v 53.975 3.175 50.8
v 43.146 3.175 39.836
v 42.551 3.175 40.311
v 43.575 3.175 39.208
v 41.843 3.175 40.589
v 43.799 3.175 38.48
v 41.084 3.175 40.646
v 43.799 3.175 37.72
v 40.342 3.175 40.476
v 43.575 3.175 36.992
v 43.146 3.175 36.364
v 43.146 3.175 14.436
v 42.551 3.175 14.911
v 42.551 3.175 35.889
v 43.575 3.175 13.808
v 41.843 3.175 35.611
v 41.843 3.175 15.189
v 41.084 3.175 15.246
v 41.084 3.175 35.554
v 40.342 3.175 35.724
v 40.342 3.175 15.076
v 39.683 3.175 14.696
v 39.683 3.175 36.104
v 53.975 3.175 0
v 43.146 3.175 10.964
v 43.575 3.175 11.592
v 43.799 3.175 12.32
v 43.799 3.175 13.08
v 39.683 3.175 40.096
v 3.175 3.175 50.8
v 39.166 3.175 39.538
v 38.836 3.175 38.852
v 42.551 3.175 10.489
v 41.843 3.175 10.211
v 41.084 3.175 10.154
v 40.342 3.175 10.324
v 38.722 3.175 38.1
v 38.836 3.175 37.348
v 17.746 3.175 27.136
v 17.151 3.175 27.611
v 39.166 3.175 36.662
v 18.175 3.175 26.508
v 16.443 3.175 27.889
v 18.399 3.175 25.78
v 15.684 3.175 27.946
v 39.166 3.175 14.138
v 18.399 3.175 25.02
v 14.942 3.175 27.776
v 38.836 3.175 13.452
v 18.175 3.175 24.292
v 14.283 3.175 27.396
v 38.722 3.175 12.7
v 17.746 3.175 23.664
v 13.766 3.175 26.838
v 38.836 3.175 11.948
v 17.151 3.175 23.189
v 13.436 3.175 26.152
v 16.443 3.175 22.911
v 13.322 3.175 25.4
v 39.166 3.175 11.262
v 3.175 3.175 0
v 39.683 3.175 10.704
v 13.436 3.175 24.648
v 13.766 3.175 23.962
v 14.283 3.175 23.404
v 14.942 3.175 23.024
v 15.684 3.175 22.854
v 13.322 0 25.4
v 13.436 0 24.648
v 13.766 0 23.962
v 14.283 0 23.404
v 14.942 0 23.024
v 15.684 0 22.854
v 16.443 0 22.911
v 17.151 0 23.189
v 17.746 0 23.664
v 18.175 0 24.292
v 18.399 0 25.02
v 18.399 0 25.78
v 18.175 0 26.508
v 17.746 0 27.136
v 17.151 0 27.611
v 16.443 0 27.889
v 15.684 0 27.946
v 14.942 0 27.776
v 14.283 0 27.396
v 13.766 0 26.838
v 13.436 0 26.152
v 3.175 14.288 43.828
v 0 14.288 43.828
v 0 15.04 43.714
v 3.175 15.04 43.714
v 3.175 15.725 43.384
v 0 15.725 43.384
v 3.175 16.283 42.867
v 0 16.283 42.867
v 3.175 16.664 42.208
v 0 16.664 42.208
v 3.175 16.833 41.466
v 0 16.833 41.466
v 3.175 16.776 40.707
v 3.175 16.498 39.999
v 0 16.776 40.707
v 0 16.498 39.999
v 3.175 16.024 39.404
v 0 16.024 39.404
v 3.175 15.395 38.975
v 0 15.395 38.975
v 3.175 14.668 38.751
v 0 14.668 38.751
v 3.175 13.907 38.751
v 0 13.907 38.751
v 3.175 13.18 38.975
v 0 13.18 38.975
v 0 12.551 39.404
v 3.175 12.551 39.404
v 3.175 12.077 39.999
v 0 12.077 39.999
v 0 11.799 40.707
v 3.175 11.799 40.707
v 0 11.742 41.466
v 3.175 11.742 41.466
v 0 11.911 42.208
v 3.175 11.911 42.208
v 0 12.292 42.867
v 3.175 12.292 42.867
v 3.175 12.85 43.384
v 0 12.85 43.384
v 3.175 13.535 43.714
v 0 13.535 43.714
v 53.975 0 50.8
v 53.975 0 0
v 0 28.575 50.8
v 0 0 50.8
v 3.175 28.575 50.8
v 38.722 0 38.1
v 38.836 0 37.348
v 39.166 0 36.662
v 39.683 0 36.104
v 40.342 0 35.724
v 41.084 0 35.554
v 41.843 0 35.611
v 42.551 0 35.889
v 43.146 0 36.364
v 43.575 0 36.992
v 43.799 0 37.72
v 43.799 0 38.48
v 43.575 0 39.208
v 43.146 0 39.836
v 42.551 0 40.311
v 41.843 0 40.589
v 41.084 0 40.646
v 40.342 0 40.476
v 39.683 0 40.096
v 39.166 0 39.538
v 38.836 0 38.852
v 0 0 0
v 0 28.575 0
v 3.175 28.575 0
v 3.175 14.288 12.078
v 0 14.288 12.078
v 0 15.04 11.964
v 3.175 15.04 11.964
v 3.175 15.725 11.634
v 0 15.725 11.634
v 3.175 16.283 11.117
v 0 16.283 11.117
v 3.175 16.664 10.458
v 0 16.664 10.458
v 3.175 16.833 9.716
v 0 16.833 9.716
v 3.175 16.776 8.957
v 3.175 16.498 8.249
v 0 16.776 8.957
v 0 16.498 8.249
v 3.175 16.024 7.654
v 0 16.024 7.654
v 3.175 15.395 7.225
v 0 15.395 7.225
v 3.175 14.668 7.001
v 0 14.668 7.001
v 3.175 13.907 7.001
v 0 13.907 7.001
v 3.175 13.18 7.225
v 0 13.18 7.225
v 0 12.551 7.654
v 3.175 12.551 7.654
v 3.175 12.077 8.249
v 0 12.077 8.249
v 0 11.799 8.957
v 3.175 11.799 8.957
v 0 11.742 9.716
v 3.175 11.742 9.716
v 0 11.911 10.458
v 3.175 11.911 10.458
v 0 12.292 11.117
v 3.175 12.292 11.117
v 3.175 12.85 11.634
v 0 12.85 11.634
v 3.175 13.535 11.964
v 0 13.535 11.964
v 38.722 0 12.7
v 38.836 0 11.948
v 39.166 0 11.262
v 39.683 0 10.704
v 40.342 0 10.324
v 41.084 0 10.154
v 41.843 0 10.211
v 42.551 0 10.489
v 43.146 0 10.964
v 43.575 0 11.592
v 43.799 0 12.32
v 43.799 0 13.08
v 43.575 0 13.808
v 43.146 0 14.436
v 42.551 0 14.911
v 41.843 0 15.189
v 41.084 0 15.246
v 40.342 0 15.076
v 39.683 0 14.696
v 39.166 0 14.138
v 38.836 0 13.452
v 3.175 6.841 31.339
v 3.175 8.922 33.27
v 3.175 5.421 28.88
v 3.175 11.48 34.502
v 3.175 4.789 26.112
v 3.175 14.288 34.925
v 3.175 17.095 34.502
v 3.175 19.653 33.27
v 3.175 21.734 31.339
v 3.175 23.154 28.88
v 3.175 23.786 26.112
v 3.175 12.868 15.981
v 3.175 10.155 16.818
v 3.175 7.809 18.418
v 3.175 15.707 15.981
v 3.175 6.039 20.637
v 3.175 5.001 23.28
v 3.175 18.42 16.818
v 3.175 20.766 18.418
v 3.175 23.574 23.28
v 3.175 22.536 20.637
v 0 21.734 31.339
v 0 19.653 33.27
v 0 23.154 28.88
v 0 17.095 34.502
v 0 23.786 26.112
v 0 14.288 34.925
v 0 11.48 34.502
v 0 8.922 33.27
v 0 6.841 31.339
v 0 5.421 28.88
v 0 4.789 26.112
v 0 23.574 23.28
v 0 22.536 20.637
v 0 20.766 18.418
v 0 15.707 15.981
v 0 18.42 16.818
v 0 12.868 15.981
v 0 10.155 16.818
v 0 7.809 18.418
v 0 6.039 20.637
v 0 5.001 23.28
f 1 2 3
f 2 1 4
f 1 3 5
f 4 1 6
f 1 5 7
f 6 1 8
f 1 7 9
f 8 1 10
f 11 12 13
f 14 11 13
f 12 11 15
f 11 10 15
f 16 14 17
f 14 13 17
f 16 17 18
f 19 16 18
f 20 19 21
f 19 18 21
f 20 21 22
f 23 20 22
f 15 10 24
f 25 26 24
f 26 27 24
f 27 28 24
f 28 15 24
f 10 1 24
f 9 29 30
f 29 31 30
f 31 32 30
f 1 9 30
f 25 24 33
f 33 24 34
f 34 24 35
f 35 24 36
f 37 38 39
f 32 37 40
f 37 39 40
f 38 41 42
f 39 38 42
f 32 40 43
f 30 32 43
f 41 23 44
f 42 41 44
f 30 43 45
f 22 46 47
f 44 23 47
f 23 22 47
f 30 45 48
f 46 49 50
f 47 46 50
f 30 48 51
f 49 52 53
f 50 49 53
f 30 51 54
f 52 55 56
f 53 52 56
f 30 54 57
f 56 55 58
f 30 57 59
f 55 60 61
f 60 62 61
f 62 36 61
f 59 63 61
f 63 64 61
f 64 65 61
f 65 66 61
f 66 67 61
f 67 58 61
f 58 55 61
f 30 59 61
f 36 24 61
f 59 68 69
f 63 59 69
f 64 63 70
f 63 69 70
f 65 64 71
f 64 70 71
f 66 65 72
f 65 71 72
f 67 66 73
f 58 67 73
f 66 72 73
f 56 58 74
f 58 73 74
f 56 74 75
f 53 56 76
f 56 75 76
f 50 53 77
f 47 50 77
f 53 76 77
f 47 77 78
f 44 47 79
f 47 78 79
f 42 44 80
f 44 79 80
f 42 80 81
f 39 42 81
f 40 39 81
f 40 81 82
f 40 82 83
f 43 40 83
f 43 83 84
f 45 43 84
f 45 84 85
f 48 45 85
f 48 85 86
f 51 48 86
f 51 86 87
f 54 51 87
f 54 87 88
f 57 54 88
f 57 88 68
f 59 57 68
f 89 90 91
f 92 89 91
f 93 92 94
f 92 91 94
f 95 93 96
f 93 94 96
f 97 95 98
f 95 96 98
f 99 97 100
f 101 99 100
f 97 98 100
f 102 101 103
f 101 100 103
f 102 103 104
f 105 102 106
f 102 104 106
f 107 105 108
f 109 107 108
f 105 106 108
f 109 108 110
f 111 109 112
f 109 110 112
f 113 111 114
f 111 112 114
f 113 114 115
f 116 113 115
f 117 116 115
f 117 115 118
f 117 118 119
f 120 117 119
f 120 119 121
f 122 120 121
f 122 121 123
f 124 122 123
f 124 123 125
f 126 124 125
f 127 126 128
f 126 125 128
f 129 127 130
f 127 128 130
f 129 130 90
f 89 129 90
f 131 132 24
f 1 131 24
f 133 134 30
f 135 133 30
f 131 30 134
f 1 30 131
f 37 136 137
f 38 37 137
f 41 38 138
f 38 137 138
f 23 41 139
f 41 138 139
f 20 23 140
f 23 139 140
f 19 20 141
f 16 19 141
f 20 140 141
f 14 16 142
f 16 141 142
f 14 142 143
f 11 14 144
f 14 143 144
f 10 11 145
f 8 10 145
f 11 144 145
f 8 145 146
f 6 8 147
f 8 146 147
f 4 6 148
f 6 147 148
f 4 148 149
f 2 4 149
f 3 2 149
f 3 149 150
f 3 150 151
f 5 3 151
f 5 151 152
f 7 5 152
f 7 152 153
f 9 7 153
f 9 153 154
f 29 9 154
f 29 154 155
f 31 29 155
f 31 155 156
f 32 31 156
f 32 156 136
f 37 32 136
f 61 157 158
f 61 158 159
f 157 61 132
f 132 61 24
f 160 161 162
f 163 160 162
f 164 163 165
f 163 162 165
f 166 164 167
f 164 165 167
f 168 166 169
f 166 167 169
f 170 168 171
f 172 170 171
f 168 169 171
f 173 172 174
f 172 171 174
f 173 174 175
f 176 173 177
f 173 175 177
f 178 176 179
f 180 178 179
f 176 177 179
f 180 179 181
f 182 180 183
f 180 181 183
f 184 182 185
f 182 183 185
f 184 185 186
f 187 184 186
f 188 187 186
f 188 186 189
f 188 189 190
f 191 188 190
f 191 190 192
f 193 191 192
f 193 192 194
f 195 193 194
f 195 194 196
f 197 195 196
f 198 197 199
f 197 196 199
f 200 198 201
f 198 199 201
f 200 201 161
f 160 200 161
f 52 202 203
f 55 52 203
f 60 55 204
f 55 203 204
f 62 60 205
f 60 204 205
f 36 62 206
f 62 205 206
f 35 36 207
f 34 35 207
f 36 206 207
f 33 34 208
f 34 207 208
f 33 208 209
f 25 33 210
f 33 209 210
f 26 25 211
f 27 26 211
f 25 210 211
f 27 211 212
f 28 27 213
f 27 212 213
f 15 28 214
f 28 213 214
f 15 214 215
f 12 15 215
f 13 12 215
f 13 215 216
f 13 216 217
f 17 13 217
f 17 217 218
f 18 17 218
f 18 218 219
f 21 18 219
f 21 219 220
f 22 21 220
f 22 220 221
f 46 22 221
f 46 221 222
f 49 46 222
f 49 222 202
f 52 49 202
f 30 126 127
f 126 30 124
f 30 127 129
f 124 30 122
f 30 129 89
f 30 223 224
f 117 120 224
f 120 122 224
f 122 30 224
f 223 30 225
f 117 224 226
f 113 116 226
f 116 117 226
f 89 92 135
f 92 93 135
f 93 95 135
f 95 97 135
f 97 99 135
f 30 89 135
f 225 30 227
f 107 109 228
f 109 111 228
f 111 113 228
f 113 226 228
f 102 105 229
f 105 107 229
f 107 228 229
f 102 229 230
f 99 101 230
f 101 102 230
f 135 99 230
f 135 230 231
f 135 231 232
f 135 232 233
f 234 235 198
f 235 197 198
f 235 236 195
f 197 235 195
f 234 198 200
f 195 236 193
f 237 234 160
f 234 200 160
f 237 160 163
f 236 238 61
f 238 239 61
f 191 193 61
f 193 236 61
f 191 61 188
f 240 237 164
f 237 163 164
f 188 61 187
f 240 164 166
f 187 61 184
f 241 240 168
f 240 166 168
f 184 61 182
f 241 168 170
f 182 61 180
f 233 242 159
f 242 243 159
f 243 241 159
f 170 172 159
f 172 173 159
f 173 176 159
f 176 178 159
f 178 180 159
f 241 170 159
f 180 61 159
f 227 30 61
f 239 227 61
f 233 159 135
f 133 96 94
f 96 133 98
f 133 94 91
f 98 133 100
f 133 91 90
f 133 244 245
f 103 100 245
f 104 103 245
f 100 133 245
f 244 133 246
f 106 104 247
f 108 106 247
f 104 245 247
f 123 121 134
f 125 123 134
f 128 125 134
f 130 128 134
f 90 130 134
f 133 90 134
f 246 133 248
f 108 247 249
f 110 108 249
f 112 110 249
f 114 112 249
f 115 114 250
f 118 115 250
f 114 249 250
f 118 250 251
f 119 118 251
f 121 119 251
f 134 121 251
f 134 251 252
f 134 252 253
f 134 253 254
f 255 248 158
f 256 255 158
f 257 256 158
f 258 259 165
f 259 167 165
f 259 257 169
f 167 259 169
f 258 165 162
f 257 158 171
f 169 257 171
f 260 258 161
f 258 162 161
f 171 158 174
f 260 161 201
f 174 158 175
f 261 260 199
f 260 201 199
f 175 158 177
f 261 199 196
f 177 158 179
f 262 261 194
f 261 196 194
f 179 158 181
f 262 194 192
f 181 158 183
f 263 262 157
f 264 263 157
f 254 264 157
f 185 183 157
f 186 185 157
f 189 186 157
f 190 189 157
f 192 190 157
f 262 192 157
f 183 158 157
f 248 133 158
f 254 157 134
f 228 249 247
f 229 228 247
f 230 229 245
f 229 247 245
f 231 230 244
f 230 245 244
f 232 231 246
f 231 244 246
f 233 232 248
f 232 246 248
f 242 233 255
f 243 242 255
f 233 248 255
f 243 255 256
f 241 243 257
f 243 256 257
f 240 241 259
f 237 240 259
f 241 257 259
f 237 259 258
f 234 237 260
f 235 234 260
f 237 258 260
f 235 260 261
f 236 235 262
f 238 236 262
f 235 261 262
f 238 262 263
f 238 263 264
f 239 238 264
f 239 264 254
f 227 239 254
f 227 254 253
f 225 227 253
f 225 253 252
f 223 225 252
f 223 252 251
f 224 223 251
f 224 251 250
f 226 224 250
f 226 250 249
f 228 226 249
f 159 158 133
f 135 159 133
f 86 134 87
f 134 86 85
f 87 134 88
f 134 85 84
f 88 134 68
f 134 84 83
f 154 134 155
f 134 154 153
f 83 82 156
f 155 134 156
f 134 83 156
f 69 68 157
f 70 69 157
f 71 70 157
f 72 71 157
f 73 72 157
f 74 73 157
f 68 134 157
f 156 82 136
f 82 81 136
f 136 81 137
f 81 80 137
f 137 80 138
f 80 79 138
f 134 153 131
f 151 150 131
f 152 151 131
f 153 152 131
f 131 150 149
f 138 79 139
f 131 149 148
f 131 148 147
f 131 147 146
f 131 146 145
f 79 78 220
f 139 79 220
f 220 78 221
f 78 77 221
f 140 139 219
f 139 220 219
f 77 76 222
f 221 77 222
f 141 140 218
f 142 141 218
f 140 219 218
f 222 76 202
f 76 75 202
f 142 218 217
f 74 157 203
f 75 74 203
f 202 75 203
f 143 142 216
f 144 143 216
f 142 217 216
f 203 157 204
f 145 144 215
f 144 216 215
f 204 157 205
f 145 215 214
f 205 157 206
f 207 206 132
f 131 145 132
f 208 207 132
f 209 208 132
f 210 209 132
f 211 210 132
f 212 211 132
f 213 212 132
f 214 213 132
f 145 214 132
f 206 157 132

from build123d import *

# Parameters (mm, degrees)
BOSS_EXTRUDE1_DEPTH = 50.8
SKETCH2_R           = 9.525
SKETCH2_W           = 50.8
SKETCH2_H           = 22.225
CUT_EXTRUDE1_DEPTH  = 50.8
SKETCH3_R           = 2.5527
CUT_EXTRUDE2_DEPTH  = 50.8
SKETCH4_R           = 2.5527
CUT_EXTRUDE3_DEPTH  = 3.175


with BuildPart() as part:
    # Sketch1 → Boss-Extrude1 (new body)
    with BuildSketch(Plane.XY):
        Polygon((3.175, 50.8), (0, 50.8), (0, 0), (3.175, 0), (53.975, 0), (53.975, 3.175), (3.175, 3.175), align=None)
    extrude(amount=BOSS_EXTRUDE1_DEPTH)

    # Sketch2 → Cut-Extrude1 (cut)
    with BuildSketch(Plane.ZY):
        with Locations((25.4, 14.2875)):
            Circle(SKETCH2_R)
        with Locations((25.4, 39.6875)):
            Rectangle(SKETCH2_W, SKETCH2_H)
    extrude(amount=-CUT_EXTRUDE1_DEPTH, mode=Mode.SUBTRACT)

    # Sketch3 → Cut-Extrude2 (cut)
    with BuildSketch(Plane(origin=(0, 0, 0), x_dir=(-1, 0, 0), z_dir=(0, -1, 0))):
        with Locations((-15.875, -25.4)):
            Circle(SKETCH3_R)
        with Locations((-41.275, -38.1)):
            Circle(SKETCH3_R)
        with Locations((-41.275, -12.7)):
            Circle(SKETCH3_R)
    extrude(amount=-CUT_EXTRUDE2_DEPTH, mode=Mode.SUBTRACT)

    # Sketch4 → Cut-Extrude3 (cut)
    with BuildSketch(Plane.ZY):
        with Locations((9.525, 14.2875)):
            Circle(SKETCH4_R)
        with Locations((41.275, 14.2875)):
            Circle(SKETCH4_R)
    extrude(amount=-CUT_EXTRUDE3_DEPTH, mode=Mode.SUBTRACT)


solid = part.part
